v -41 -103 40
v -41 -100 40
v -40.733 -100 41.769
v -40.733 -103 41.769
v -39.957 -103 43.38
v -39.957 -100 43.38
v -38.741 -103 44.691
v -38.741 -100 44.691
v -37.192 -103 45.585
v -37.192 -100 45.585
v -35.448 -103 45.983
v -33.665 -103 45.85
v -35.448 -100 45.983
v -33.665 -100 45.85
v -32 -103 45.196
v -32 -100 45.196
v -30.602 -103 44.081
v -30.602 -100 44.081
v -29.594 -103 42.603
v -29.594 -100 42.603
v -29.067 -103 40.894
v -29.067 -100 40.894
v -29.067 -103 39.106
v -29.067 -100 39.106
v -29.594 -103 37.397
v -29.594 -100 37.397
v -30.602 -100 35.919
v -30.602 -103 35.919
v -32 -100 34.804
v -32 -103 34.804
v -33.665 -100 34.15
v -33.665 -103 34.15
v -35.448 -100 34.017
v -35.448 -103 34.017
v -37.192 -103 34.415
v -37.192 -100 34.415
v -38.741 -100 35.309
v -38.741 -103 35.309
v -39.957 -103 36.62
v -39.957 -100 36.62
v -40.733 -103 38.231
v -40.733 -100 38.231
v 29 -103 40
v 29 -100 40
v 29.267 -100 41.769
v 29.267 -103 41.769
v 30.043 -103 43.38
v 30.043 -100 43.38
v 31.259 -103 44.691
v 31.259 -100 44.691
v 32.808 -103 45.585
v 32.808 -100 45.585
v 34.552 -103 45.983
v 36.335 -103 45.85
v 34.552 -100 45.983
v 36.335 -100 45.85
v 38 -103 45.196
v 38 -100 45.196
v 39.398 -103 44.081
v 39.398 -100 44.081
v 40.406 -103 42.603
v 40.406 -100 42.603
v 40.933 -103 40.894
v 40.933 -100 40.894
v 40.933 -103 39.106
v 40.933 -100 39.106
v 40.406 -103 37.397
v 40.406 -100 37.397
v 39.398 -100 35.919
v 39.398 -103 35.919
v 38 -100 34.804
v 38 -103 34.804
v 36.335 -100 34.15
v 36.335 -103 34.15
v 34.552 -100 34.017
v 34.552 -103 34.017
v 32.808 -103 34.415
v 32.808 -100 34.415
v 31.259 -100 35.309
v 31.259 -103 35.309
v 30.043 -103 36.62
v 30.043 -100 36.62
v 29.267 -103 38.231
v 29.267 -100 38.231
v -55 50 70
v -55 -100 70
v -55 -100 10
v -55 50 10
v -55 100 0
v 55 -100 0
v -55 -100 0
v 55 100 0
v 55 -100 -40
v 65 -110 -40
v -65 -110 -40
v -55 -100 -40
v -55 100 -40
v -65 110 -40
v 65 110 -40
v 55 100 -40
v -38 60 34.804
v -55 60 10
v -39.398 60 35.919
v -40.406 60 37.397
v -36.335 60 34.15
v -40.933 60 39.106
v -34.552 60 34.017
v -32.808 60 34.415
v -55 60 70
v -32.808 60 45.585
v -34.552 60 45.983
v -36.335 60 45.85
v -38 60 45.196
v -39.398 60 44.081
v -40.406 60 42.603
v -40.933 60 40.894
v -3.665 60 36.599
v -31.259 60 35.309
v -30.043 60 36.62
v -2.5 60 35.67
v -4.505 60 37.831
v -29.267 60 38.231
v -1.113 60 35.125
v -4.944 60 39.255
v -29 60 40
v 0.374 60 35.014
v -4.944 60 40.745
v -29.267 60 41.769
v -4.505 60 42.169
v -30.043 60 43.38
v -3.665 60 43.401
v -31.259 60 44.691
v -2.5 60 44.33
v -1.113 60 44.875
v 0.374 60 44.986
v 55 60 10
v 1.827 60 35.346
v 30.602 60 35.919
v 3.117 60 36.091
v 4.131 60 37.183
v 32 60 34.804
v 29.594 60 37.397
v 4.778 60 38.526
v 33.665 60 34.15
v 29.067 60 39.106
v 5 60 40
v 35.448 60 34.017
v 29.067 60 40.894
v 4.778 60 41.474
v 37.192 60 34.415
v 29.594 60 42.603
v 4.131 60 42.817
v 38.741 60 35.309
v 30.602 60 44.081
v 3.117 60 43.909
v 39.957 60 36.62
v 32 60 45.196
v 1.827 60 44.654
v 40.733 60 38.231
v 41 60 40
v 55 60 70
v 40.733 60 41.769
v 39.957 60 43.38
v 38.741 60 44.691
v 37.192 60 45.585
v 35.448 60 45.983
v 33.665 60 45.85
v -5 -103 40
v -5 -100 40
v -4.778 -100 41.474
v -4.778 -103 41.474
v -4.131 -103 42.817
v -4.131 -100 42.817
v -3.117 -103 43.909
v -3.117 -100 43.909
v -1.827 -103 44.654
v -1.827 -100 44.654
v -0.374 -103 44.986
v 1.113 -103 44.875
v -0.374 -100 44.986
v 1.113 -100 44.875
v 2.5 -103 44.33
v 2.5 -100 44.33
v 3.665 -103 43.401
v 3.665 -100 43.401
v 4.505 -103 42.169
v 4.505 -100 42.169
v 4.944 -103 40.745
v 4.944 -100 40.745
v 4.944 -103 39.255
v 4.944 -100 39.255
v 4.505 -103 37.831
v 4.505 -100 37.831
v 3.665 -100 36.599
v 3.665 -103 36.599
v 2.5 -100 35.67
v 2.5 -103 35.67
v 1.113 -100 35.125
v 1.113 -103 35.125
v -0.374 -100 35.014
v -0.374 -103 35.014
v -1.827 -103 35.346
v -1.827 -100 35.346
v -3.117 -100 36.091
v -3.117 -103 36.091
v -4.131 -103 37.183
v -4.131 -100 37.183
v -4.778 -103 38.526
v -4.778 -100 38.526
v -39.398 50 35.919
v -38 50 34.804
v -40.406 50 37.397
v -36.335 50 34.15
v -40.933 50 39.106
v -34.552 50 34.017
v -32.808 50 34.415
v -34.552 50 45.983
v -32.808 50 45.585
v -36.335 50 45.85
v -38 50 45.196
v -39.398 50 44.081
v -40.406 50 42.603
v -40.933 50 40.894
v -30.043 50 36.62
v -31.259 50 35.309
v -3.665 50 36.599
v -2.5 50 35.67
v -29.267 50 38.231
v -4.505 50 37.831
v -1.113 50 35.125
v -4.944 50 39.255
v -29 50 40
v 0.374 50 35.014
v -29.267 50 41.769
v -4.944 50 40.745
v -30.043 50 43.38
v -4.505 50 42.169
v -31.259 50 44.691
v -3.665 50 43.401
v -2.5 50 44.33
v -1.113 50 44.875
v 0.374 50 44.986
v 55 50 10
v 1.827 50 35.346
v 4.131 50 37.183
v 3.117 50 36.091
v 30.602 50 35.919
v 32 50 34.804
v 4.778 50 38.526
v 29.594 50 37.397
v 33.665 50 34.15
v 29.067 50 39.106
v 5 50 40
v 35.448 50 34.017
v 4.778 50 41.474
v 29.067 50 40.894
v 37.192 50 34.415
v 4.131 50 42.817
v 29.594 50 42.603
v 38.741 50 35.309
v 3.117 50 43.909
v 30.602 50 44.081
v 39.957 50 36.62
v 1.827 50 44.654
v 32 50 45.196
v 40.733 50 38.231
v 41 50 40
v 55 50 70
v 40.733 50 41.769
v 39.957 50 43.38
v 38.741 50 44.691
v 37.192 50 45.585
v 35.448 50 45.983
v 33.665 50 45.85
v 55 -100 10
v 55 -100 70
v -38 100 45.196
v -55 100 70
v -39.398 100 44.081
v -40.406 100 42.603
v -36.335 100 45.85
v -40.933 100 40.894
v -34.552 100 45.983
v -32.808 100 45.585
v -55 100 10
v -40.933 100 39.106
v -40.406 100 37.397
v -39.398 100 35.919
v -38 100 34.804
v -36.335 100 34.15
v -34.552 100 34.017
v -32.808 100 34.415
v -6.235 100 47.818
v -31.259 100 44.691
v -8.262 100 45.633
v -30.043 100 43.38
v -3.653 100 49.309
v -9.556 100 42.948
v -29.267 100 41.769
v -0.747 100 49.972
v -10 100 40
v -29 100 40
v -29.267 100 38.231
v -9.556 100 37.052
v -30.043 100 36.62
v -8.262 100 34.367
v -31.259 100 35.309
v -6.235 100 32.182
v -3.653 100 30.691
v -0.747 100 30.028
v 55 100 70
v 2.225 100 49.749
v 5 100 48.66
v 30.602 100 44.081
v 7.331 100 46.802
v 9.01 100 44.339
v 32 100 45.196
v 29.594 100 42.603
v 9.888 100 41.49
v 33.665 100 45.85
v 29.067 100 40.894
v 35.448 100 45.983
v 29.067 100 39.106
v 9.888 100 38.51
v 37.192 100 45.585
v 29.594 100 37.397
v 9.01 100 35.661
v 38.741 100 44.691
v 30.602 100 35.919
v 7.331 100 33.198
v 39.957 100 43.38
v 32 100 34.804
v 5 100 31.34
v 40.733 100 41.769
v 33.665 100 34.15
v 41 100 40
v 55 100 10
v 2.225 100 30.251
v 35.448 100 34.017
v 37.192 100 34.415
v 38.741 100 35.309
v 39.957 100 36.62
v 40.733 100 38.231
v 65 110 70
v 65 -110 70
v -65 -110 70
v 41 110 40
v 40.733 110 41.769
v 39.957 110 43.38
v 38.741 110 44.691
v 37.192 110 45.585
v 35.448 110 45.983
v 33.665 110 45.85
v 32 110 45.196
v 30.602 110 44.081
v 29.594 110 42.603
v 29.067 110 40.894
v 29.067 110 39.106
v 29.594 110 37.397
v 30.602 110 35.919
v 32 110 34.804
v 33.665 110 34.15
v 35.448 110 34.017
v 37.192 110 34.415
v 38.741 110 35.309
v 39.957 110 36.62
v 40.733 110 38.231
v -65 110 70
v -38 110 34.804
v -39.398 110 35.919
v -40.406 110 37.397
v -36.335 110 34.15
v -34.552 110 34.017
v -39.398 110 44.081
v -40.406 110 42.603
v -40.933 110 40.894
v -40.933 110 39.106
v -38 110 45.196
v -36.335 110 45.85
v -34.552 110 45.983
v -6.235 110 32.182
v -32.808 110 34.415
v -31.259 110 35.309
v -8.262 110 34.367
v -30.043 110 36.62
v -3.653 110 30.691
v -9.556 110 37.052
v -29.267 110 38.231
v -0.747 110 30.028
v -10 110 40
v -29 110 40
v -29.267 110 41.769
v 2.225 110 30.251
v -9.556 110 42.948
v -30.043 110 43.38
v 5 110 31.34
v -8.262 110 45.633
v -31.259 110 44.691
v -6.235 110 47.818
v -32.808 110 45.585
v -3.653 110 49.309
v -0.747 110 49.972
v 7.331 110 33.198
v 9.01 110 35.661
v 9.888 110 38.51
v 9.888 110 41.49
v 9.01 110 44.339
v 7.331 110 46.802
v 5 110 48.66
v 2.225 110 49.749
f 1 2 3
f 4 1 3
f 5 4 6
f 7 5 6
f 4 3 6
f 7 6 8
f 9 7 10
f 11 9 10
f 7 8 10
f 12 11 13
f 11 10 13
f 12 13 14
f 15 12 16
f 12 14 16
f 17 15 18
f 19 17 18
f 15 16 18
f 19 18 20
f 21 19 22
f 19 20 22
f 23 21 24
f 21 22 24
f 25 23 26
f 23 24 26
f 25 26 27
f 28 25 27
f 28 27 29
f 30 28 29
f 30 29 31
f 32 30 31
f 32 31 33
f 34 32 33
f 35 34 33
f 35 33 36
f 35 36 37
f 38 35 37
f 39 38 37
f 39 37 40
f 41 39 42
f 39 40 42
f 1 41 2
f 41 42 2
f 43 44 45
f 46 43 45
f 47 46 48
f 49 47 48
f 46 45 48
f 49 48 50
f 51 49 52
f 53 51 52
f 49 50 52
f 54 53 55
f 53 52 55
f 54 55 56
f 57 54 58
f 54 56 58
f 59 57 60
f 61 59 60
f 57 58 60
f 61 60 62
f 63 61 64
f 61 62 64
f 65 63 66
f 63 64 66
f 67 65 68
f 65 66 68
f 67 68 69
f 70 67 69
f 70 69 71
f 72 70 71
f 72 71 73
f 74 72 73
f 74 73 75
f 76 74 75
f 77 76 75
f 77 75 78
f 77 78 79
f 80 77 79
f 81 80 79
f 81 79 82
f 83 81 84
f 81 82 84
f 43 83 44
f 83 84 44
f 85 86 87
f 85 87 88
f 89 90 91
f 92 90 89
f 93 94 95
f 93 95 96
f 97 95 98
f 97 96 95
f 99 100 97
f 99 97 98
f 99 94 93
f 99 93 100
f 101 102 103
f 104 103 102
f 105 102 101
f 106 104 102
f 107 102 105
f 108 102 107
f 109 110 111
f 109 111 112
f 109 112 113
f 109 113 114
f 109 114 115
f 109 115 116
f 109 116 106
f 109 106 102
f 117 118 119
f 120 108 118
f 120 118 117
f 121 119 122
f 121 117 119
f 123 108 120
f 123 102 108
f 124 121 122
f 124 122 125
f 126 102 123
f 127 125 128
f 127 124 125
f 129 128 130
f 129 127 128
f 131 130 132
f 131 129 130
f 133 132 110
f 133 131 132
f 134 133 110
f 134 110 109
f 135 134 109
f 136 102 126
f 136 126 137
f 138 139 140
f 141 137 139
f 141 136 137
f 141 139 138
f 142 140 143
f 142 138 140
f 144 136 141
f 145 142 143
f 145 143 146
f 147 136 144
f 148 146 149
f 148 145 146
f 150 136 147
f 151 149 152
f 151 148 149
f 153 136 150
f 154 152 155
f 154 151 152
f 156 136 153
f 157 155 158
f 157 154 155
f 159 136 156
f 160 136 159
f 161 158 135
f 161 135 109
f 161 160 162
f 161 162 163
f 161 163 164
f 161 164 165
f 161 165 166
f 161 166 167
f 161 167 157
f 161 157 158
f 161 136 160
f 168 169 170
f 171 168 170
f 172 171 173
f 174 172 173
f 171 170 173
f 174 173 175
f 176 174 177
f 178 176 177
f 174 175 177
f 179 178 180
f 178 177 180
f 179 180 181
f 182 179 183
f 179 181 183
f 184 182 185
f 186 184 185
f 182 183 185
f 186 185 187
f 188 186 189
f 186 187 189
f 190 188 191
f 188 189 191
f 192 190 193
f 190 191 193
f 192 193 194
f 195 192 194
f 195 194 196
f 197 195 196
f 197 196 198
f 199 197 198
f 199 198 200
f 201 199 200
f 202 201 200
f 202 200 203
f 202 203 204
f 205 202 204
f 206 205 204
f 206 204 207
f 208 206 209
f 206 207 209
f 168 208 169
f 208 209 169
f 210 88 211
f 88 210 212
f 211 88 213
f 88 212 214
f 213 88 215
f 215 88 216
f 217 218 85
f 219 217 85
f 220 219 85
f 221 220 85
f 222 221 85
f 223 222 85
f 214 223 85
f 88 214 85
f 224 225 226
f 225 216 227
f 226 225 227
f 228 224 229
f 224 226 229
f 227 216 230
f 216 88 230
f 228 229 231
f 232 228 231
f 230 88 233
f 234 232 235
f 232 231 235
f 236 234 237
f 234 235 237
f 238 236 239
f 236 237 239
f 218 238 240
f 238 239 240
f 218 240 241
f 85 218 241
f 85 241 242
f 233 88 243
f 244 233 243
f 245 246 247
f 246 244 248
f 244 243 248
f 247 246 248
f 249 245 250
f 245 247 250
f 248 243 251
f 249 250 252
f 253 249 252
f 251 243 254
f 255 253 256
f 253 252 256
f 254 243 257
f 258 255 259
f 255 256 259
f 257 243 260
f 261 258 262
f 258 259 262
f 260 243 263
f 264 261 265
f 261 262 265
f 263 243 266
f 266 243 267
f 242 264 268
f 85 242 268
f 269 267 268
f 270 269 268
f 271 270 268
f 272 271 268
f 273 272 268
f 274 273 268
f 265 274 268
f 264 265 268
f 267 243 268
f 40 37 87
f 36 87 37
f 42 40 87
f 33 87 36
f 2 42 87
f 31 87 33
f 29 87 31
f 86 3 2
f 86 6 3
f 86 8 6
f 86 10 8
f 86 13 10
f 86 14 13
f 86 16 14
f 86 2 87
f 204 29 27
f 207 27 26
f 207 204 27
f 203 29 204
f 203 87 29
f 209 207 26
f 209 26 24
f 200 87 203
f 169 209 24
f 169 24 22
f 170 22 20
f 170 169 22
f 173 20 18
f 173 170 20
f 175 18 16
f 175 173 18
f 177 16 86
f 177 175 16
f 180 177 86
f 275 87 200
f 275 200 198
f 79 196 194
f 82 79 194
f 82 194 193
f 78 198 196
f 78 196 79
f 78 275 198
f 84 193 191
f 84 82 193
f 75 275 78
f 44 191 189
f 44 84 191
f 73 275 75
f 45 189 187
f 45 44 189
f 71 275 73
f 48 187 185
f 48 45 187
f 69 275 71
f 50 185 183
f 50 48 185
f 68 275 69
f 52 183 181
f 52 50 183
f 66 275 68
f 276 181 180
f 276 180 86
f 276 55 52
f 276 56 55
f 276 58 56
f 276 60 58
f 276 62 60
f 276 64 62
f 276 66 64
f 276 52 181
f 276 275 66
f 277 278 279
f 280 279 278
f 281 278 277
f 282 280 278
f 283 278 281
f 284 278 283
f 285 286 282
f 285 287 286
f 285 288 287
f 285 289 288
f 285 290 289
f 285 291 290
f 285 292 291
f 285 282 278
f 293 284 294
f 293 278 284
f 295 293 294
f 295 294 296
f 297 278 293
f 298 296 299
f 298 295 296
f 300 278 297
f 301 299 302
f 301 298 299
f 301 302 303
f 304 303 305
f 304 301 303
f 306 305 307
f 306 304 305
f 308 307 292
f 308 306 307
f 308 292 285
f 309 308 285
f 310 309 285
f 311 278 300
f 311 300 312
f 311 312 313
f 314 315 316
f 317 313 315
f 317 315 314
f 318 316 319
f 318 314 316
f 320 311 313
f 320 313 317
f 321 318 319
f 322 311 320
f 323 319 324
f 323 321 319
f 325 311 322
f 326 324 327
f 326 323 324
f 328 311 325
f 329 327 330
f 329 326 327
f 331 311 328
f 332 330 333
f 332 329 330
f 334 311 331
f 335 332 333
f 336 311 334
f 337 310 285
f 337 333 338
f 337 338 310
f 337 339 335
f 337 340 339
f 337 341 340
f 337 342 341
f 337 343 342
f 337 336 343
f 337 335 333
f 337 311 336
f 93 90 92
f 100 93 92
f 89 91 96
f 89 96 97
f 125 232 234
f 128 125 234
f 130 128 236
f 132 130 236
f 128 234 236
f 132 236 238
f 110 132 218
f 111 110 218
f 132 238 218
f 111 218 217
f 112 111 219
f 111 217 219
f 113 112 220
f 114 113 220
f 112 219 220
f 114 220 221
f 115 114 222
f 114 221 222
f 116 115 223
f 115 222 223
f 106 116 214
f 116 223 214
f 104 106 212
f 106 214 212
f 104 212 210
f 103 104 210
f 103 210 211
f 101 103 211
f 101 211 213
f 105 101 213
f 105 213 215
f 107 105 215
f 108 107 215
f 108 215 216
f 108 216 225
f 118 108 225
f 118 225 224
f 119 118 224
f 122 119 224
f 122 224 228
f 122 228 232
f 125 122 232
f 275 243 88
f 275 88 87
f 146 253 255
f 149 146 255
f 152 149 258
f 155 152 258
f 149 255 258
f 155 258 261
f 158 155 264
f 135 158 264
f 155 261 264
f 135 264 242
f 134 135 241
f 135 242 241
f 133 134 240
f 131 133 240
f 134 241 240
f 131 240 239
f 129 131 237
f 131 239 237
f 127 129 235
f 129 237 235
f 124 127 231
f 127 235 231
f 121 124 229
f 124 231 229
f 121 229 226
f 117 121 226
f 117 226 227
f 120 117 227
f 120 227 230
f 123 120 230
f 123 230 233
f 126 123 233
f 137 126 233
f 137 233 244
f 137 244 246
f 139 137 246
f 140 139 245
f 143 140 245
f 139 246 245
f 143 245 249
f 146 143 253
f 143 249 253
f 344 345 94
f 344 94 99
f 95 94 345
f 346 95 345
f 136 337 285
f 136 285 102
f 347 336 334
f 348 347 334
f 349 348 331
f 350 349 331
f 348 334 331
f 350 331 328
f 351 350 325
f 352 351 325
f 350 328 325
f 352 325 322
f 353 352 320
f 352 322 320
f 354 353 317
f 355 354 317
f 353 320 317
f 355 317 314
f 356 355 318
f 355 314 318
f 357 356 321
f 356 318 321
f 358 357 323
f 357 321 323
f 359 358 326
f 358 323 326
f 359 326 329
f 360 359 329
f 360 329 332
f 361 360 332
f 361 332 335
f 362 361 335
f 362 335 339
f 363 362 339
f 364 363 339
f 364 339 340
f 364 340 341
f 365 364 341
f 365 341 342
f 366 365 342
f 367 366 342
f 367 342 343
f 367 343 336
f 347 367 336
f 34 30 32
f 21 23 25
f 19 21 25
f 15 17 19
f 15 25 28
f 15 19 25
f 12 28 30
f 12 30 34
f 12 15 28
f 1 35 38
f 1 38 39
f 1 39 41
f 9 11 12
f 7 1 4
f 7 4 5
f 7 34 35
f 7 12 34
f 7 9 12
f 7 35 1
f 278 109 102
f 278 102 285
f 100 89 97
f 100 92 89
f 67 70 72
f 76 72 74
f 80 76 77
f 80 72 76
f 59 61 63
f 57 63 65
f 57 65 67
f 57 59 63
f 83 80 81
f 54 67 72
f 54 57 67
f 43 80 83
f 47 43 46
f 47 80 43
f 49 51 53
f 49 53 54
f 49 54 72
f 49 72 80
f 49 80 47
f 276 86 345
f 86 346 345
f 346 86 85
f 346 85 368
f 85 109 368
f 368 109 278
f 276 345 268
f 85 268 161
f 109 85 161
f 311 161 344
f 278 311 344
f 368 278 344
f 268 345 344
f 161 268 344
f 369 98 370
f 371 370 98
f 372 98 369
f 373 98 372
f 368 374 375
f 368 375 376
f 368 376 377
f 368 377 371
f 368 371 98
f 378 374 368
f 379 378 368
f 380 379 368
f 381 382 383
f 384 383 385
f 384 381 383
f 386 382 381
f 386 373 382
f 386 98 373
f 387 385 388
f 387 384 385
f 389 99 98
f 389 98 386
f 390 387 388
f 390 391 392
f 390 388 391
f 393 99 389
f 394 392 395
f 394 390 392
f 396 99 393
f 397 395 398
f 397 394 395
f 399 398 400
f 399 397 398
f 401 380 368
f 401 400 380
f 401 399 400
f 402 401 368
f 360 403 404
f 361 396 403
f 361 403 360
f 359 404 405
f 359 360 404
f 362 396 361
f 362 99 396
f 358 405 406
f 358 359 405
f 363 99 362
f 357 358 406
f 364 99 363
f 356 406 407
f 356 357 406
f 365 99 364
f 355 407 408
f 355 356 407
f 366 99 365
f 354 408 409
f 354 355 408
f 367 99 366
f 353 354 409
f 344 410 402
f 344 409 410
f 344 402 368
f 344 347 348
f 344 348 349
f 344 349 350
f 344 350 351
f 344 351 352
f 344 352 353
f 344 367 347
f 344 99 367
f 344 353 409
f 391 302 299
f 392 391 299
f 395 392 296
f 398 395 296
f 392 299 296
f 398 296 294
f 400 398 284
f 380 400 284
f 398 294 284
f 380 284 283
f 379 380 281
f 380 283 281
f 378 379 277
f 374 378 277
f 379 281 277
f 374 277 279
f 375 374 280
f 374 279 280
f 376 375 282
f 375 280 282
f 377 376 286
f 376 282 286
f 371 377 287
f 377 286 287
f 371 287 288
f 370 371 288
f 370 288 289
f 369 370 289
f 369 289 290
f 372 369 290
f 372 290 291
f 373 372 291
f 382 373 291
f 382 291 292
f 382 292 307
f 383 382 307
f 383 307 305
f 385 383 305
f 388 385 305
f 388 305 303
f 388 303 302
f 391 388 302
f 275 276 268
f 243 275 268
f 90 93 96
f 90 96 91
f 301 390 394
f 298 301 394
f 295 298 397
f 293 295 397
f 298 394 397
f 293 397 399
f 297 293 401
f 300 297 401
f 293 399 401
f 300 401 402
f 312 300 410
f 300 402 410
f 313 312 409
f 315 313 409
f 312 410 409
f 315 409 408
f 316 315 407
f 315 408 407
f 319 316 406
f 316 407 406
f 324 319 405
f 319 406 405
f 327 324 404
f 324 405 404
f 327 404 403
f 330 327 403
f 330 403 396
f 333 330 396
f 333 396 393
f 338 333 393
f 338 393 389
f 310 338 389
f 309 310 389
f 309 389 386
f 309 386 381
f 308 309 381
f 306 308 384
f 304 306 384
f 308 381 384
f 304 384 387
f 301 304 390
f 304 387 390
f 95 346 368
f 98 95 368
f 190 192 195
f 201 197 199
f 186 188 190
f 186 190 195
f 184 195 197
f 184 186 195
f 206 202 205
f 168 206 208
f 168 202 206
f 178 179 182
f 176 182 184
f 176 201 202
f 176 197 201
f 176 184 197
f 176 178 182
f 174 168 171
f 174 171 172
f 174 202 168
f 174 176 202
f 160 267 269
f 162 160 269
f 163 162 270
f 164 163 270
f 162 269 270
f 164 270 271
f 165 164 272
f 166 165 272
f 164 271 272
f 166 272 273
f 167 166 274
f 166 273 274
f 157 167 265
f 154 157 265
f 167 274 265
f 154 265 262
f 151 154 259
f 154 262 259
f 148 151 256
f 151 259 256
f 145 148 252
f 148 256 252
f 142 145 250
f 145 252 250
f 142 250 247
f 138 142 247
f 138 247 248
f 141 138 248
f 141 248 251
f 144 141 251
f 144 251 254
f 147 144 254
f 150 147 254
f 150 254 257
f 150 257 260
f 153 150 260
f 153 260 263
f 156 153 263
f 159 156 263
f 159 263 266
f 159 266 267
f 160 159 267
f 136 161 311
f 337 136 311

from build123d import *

# Parameters (mm, degrees)
F0_W      = 10
F0_H      = 60
F1_DEPTH  = 55
F2_W      = 220
F2_H      = 110
F3_DEPTH  = 10
F5_R      = 10
F6_DEPTH  = 10
F7_R      = 5
F8_DEPTH  = 10
F9_R      = 5
F9_R_2    = 6
F10_DEPTH = 3
F11_R     = 6
F12_DEPTH = 60.001


with BuildPart() as f1:
    # F0 (on Right) → F1 (new body, symmetric)
    with BuildSketch(Plane.YZ):
        Polygon((100, 10), (100, 0), (100, -40), (110, -40), (110, 70), (100, 70), align=None)
        Polygon((50, 10), (-100, 10), (-100, 0), (100, 0), (100, 10), (60, 10), align=None)
        with Locations((55, 40)):
            Rectangle(F0_W, F0_H)
        Polygon((-100, 70), (-110, 70), (-110, -40), (-100, -40), (-100, 0), (-100, 10), align=None)
    extrude(amount=F1_DEPTH, both=True)

    # F2 (on face) → F3 (join)
    with BuildSketch(Plane.YZ.offset(55)):
        with Locations((0, 15)):
            Rectangle(F2_W, F2_H)
    extrude(amount=F3_DEPTH)

    # F4: F1 across plane


with BuildPart() as f1_1:
    add(f1.part)
    add(f1.part.mirror(Plane.YZ))

    # F5 (on face) → F6 (cut, through all)
    with BuildSketch(Plane(origin=(0, 110, 0), x_dir=(-1, 0, 0), z_dir=(0, 1, 0))):
        with Locations((0, 40)):
            Circle(F5_R)
    extrude(amount=-F6_DEPTH, mode=Mode.SUBTRACT)

    # F7 (on face) → F8 (cut, through all)
    with BuildSketch(Plane.XZ.offset(-50)):
        with Locations((0, 40)):
            Circle(F7_R)
    extrude(amount=-F8_DEPTH, mode=Mode.SUBTRACT)

    # F9 (on face) → F10 (cut)
    with BuildSketch(Plane(origin=(0, -100, 0), x_dir=(-1, 0, 0), z_dir=(0, 1, 0))):
        with Locations((0, 40)):
            Circle(F9_R)
        with Locations((35, 40)):
            Circle(F9_R_2)
        with Locations((-35, 40)):
            Circle(F9_R_2)
    extrude(amount=-F10_DEPTH, mode=Mode.SUBTRACT)

    # F11 (on face) → F12 (cut, through all)
    with BuildSketch(Plane.XZ.offset(-50)):
        with Locations((-35, 40)):
            Circle(F11_R)
        with Locations((35, 40)):
            Circle(F11_R)
    extrude(amount=-F12_DEPTH, mode=Mode.SUBTRACT)


solid = f1_1.part
